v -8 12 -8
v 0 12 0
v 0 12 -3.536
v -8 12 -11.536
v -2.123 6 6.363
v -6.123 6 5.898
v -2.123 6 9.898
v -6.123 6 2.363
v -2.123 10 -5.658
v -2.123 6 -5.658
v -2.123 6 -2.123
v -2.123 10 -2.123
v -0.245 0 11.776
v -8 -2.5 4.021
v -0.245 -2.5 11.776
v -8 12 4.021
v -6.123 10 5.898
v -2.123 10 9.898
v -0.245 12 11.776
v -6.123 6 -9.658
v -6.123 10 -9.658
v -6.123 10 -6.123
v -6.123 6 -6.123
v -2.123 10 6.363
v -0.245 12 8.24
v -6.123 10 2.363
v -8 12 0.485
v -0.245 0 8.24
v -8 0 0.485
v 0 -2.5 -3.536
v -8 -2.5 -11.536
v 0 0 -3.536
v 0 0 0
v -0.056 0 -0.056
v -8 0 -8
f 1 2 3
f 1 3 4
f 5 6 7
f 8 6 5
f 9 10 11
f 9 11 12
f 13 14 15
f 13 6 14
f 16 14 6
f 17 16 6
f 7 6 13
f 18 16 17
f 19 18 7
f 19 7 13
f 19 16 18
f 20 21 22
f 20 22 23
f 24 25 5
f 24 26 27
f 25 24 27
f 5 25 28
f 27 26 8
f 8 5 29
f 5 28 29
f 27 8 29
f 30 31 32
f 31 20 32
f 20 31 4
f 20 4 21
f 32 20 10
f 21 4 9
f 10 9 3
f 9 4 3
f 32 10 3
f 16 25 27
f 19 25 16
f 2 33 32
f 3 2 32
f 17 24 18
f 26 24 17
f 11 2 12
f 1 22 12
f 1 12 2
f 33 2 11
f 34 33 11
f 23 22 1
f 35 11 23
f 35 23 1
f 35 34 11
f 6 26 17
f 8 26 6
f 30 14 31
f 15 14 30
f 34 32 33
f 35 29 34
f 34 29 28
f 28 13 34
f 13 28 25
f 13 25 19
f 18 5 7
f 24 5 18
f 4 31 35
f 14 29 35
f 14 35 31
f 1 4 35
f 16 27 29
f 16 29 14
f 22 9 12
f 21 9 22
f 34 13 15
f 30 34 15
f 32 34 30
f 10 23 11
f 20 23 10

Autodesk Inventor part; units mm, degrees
ref_plane "YZ Plane" through (0, 0, 0) normal (1, 0, 0) x (0, 1, 0)
ref_plane "XZ Plane" through (0, 0, 0) normal (0, 1, 0) x (-1, 0, 0)
ref_plane "XY Plane" through (0, 0, 0) normal (0, 0, 1) x (1, 0, 0)
sketch "Sketch2" plane through (0, 0, 0) normal (0, 1, 0) x (-1, 0, 0)
  line L0 (0, 0) -> (7.7547, -7.7547) construction
  line L1 (0, 0) -> (0, -11.6637) construction
  line L2 (-25.4458, 33.931) -> (0, 8.4853) construction
  line L3 (0, 0) -> (8, -8)
  line L4 (8, -11.5355) -> (8, -11.5355)
  line L5 (8, -8) -> (8, -11.5355)
  line L6 (0, 0) -> (0, -3.5355)
  line L7 (0, 8.4853) -> (0.2453, 8.24)
  line L8 (0.2453, 11.7755) -> (8, 4.0208)
  line L9 (8, 4.0208) -> (8, 0.4853)
  line L10 (0.2453, 8.24) -> (8, 0.4853)
  line L11 (8, -11.5355) -> (0, -3.5355)
  line L12 (0, 8.4853) -> (8, 0.4853) construction
  line L13 (0.2453, 8.24) -> (0.2453, 11.7755)
  dimension "d0" = 45
  dimension "d1" = 6
  dimension "d2" = 2.5
  dimension "d4" = 8
extrude "Extrusion1" add sketch "Sketch2" along normal blind 12
sketch "Sketch3" plane through (0, 0, 0) normal (0, -1, 0) x (1, 0, 0)
  line L0 (-8, 4.0208) -> (-0.2453, 11.7755) projected
  line L1 (-8, -11.5355) -> (0, -3.5355) projected
  line L2 (-8, -8) -> (-8, -11.5355) projected
  line L3 (0, 26.3321) -> (0, -17.8468) projected
  line L4 (-8, 0.4853) -> (-8, 4.0208) projected
  line L5 (-0.2453, 11.7755) -> (0, -3.5355)
  line L6 (-8, -11.5355) -> (-8, 4.0208)
  line L7 (-8, 4.0208) -> (-0.2453, 11.7755)
  line L8 (0, -3.5355) -> (-8, -11.5355)
  point P0 (0, 0)
  point P1 (-15, -6.5147)
extrude "Extrusion2" add sketch "Sketch3" along normal blind 2.5
sketch "Sketch4" plane through (0, 0, 0) normal (0, 0, 1) x (1, 0, 0)
  line L0 (-8, 12) -> (-0.2453, 12) projected
  line L1 (-2.1227, 10) -> (-6.1227, 10)
  line L2 (-6.1227, 10) -> (-6.1227, 6)
  line L3 (-6.1227, 6) -> (-2.1227, 6)
  line L4 (-2.1227, 6) -> (-2.1227, 10)
  line L5 (-4.1227, 12) -> (-4.1227, 0)
  line L6 (0, 0) -> (-8, 0) projected
  point P0 (-4.1227, 10)
  dimension "d9" = 4
  dimension "d10" = 4
  dimension "d13" = 6
extrude "Extrusion3" cut sketch "Sketch4" along normal through all both and the other way through all
properties part number "gimbal_stick_fixation"
